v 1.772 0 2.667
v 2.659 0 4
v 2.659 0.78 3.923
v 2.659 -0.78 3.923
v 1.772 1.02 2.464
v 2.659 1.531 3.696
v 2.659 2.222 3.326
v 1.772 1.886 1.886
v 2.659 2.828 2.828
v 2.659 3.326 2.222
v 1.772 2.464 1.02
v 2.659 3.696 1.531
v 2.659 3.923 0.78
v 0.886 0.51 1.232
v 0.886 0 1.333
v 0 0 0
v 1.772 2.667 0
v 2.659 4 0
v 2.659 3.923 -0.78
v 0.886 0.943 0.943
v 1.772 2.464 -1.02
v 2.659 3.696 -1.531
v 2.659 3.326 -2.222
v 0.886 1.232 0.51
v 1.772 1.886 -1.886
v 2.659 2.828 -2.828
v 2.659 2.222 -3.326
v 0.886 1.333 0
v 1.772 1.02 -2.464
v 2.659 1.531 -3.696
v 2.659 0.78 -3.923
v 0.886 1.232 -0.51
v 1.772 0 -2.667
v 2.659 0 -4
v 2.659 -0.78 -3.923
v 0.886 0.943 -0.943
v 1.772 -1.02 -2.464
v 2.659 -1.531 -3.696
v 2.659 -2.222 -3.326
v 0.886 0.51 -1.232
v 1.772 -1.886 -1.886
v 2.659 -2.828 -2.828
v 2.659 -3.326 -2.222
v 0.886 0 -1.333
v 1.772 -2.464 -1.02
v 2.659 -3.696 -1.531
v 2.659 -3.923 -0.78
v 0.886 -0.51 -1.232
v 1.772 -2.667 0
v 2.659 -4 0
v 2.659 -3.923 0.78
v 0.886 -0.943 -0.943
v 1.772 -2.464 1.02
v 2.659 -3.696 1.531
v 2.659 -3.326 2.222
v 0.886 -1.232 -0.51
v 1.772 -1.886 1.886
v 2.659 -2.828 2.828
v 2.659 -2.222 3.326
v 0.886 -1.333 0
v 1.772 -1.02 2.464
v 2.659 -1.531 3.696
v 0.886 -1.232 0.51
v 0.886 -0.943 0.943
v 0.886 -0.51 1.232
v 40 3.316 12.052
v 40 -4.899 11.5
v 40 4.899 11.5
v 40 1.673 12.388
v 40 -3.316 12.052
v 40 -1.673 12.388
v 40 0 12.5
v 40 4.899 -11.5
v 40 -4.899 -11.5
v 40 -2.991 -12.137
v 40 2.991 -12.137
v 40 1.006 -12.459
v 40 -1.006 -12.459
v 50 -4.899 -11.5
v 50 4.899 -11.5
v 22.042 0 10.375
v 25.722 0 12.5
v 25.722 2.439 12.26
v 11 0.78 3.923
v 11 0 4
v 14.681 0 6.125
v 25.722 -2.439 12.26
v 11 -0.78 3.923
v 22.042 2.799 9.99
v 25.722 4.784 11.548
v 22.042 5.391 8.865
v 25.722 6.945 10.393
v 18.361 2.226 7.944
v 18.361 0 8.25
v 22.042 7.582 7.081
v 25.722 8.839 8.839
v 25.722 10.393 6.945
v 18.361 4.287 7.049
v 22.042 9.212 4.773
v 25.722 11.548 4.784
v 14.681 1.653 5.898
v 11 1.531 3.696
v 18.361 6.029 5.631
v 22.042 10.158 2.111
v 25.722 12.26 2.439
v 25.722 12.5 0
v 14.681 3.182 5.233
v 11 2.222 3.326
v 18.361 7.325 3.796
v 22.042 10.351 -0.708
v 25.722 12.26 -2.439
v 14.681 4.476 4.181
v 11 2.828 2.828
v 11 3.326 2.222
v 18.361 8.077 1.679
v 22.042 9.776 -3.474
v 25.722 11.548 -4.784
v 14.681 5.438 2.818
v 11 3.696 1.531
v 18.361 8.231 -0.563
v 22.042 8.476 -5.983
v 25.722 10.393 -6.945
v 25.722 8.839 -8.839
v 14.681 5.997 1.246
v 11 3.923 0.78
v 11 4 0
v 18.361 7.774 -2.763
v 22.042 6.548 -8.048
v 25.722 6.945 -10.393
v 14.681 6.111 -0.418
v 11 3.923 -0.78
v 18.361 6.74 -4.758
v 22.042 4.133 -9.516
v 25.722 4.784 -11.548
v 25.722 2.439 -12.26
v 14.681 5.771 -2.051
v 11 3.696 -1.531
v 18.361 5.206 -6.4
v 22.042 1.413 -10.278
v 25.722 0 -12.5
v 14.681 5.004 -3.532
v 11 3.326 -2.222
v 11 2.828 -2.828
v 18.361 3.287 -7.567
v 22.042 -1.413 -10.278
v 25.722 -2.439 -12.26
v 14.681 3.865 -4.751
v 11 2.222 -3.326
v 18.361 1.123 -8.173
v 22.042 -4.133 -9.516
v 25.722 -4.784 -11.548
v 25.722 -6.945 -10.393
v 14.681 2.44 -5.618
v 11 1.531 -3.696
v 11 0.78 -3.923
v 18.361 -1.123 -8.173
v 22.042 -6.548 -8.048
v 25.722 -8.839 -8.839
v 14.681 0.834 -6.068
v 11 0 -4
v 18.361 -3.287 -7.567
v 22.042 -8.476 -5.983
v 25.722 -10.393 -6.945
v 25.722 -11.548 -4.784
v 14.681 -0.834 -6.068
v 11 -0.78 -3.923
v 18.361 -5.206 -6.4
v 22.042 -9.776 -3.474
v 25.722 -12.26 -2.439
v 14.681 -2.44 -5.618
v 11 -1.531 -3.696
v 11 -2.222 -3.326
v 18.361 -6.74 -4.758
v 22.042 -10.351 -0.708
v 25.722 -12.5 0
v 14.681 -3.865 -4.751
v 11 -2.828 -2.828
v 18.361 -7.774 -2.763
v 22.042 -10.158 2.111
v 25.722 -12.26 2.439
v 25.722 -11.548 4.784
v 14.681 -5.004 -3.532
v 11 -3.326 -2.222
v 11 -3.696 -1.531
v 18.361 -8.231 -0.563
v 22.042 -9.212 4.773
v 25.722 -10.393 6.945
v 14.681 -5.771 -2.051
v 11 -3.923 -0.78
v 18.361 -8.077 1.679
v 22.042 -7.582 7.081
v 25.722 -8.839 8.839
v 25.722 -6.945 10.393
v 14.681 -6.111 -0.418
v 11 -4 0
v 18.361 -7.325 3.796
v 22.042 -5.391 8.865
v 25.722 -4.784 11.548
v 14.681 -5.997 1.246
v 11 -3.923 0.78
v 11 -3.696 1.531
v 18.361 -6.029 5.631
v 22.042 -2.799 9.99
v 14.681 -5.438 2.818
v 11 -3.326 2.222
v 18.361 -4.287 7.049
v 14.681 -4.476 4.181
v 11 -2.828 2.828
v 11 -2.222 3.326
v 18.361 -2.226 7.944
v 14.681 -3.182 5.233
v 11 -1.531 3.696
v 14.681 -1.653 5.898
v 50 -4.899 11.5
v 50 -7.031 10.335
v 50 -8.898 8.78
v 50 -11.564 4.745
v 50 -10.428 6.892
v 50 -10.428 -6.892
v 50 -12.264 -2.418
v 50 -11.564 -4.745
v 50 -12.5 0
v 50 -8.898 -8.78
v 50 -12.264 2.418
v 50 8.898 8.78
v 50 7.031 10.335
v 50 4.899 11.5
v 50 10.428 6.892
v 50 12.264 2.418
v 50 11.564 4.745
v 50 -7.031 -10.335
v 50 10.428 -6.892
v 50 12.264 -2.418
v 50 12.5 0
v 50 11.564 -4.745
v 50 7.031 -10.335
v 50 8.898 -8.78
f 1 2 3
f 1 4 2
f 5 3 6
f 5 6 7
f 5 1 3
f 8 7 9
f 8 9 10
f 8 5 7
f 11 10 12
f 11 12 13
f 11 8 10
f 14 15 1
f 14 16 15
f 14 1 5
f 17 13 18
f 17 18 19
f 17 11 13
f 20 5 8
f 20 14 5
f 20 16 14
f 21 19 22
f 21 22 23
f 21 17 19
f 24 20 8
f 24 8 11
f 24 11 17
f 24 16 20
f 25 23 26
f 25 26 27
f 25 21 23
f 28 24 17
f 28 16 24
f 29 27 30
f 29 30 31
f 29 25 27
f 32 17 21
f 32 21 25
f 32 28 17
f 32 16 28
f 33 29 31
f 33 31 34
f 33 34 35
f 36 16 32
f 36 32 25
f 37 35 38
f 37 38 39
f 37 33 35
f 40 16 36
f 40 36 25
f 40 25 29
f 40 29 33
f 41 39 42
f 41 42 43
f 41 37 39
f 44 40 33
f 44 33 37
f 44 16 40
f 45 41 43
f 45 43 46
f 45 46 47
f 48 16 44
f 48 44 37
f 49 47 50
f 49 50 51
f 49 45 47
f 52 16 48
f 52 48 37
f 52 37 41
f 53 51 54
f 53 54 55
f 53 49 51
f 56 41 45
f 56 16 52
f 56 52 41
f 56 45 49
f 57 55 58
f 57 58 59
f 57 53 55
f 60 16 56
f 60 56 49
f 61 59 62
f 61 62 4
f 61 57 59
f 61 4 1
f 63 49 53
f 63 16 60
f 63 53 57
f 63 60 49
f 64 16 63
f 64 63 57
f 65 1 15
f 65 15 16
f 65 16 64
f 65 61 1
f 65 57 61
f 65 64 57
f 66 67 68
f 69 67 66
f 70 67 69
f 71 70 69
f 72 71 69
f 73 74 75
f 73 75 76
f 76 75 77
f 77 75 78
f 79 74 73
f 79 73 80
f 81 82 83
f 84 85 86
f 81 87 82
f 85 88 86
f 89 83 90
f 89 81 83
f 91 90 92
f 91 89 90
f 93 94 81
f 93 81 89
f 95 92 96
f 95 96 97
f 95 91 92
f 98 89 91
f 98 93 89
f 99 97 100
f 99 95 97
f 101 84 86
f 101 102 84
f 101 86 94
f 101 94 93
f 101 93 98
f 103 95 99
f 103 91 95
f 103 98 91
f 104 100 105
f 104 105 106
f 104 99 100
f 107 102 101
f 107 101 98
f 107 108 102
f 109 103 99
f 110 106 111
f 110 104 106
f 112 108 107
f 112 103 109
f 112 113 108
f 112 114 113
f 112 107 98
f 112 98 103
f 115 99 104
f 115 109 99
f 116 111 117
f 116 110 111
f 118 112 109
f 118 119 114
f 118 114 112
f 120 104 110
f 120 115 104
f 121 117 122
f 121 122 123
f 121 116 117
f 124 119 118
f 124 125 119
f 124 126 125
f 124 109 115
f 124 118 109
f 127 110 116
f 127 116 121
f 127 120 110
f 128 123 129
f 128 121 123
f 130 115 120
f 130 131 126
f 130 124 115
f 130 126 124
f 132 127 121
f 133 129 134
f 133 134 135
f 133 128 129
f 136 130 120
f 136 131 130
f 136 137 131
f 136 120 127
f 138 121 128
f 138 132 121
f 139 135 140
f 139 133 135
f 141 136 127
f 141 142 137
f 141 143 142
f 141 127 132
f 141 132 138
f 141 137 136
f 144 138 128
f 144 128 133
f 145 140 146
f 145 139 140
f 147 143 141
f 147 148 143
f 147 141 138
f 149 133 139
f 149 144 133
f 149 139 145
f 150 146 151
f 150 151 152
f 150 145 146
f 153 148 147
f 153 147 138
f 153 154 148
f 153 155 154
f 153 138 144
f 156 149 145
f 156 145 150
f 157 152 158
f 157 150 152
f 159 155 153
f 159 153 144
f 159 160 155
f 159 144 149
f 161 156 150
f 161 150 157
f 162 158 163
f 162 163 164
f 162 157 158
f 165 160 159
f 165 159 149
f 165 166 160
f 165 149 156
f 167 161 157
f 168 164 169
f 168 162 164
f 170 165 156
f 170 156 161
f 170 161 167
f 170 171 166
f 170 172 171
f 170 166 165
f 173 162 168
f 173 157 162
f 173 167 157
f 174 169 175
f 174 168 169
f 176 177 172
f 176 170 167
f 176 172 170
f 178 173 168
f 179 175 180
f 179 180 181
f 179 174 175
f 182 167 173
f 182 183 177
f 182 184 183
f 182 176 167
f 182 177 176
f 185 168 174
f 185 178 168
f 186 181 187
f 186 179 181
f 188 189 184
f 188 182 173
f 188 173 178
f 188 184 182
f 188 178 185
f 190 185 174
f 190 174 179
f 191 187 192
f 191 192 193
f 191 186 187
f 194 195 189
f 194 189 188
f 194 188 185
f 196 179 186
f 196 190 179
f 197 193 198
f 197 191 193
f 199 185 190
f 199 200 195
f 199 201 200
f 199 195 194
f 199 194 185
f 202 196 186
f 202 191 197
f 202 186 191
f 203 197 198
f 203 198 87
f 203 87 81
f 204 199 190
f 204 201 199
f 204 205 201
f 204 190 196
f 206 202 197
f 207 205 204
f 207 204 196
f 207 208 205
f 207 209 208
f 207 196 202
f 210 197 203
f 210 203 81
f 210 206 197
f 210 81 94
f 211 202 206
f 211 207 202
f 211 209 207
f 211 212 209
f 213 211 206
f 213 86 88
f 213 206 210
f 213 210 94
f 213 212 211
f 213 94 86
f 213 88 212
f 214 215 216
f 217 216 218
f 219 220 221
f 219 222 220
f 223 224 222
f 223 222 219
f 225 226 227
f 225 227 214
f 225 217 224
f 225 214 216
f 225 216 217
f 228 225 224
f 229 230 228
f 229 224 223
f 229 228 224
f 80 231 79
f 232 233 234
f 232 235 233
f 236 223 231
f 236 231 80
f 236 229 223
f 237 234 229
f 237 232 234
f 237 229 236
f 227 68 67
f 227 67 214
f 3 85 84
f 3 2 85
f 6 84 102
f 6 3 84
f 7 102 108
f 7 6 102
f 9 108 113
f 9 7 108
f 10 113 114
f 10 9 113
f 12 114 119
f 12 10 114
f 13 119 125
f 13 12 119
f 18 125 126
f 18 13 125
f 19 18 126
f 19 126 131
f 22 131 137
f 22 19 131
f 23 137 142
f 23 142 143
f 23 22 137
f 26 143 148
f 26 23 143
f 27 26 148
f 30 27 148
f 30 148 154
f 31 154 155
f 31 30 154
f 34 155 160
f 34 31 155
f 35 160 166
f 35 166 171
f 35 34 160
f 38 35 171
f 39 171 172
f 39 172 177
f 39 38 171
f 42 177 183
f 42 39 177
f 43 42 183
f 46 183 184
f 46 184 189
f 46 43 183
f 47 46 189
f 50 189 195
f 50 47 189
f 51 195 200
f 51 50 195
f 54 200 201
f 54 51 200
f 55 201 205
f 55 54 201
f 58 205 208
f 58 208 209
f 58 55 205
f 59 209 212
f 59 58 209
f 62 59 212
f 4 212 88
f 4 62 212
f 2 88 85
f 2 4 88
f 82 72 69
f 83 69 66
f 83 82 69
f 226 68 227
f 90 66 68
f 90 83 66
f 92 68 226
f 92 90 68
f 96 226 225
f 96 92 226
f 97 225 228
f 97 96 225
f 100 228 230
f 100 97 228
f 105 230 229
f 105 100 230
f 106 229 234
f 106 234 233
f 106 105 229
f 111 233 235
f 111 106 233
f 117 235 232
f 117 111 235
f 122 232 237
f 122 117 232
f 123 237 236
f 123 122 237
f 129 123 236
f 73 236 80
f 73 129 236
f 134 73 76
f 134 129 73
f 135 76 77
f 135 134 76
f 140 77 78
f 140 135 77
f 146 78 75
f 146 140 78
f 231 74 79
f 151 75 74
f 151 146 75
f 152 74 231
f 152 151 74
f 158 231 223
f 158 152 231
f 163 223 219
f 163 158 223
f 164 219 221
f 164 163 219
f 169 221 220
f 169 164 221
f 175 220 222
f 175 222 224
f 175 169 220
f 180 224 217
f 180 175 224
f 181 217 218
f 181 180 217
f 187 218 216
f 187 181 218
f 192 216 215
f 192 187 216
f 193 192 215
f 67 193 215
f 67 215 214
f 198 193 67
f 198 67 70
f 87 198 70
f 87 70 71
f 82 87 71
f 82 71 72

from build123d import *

# Parameters (mm, degrees)
F2_W     = 13.42322
F2_H     = 3.613965
F3_DEPTH = 12.5


with BuildPart() as f1:
    # F0 (on Front) → F1 (revolve)
    with BuildSketch(Plane.XZ):
        Polygon((2.658645, 4), (0, 0), (50, 0), (50, 12.5), (25.722432, 12.5), (11, 4), align=None)
    revolve(axis=Axis((25, 0, 0), (-1, 0, 0)))

    # F2 (on Front) → F3 (cut, symmetric)
    with BuildSketch(Plane.XZ):
        with Locations((46.71161, 13.306983)):
            Rectangle(F2_W, F2_H)
        with Locations((46.71161, -13.306983)):
            Rectangle(F2_W, F2_H)
    extrude(amount=F3_DEPTH, both=True, mode=Mode.SUBTRACT)


solid = f1.part
